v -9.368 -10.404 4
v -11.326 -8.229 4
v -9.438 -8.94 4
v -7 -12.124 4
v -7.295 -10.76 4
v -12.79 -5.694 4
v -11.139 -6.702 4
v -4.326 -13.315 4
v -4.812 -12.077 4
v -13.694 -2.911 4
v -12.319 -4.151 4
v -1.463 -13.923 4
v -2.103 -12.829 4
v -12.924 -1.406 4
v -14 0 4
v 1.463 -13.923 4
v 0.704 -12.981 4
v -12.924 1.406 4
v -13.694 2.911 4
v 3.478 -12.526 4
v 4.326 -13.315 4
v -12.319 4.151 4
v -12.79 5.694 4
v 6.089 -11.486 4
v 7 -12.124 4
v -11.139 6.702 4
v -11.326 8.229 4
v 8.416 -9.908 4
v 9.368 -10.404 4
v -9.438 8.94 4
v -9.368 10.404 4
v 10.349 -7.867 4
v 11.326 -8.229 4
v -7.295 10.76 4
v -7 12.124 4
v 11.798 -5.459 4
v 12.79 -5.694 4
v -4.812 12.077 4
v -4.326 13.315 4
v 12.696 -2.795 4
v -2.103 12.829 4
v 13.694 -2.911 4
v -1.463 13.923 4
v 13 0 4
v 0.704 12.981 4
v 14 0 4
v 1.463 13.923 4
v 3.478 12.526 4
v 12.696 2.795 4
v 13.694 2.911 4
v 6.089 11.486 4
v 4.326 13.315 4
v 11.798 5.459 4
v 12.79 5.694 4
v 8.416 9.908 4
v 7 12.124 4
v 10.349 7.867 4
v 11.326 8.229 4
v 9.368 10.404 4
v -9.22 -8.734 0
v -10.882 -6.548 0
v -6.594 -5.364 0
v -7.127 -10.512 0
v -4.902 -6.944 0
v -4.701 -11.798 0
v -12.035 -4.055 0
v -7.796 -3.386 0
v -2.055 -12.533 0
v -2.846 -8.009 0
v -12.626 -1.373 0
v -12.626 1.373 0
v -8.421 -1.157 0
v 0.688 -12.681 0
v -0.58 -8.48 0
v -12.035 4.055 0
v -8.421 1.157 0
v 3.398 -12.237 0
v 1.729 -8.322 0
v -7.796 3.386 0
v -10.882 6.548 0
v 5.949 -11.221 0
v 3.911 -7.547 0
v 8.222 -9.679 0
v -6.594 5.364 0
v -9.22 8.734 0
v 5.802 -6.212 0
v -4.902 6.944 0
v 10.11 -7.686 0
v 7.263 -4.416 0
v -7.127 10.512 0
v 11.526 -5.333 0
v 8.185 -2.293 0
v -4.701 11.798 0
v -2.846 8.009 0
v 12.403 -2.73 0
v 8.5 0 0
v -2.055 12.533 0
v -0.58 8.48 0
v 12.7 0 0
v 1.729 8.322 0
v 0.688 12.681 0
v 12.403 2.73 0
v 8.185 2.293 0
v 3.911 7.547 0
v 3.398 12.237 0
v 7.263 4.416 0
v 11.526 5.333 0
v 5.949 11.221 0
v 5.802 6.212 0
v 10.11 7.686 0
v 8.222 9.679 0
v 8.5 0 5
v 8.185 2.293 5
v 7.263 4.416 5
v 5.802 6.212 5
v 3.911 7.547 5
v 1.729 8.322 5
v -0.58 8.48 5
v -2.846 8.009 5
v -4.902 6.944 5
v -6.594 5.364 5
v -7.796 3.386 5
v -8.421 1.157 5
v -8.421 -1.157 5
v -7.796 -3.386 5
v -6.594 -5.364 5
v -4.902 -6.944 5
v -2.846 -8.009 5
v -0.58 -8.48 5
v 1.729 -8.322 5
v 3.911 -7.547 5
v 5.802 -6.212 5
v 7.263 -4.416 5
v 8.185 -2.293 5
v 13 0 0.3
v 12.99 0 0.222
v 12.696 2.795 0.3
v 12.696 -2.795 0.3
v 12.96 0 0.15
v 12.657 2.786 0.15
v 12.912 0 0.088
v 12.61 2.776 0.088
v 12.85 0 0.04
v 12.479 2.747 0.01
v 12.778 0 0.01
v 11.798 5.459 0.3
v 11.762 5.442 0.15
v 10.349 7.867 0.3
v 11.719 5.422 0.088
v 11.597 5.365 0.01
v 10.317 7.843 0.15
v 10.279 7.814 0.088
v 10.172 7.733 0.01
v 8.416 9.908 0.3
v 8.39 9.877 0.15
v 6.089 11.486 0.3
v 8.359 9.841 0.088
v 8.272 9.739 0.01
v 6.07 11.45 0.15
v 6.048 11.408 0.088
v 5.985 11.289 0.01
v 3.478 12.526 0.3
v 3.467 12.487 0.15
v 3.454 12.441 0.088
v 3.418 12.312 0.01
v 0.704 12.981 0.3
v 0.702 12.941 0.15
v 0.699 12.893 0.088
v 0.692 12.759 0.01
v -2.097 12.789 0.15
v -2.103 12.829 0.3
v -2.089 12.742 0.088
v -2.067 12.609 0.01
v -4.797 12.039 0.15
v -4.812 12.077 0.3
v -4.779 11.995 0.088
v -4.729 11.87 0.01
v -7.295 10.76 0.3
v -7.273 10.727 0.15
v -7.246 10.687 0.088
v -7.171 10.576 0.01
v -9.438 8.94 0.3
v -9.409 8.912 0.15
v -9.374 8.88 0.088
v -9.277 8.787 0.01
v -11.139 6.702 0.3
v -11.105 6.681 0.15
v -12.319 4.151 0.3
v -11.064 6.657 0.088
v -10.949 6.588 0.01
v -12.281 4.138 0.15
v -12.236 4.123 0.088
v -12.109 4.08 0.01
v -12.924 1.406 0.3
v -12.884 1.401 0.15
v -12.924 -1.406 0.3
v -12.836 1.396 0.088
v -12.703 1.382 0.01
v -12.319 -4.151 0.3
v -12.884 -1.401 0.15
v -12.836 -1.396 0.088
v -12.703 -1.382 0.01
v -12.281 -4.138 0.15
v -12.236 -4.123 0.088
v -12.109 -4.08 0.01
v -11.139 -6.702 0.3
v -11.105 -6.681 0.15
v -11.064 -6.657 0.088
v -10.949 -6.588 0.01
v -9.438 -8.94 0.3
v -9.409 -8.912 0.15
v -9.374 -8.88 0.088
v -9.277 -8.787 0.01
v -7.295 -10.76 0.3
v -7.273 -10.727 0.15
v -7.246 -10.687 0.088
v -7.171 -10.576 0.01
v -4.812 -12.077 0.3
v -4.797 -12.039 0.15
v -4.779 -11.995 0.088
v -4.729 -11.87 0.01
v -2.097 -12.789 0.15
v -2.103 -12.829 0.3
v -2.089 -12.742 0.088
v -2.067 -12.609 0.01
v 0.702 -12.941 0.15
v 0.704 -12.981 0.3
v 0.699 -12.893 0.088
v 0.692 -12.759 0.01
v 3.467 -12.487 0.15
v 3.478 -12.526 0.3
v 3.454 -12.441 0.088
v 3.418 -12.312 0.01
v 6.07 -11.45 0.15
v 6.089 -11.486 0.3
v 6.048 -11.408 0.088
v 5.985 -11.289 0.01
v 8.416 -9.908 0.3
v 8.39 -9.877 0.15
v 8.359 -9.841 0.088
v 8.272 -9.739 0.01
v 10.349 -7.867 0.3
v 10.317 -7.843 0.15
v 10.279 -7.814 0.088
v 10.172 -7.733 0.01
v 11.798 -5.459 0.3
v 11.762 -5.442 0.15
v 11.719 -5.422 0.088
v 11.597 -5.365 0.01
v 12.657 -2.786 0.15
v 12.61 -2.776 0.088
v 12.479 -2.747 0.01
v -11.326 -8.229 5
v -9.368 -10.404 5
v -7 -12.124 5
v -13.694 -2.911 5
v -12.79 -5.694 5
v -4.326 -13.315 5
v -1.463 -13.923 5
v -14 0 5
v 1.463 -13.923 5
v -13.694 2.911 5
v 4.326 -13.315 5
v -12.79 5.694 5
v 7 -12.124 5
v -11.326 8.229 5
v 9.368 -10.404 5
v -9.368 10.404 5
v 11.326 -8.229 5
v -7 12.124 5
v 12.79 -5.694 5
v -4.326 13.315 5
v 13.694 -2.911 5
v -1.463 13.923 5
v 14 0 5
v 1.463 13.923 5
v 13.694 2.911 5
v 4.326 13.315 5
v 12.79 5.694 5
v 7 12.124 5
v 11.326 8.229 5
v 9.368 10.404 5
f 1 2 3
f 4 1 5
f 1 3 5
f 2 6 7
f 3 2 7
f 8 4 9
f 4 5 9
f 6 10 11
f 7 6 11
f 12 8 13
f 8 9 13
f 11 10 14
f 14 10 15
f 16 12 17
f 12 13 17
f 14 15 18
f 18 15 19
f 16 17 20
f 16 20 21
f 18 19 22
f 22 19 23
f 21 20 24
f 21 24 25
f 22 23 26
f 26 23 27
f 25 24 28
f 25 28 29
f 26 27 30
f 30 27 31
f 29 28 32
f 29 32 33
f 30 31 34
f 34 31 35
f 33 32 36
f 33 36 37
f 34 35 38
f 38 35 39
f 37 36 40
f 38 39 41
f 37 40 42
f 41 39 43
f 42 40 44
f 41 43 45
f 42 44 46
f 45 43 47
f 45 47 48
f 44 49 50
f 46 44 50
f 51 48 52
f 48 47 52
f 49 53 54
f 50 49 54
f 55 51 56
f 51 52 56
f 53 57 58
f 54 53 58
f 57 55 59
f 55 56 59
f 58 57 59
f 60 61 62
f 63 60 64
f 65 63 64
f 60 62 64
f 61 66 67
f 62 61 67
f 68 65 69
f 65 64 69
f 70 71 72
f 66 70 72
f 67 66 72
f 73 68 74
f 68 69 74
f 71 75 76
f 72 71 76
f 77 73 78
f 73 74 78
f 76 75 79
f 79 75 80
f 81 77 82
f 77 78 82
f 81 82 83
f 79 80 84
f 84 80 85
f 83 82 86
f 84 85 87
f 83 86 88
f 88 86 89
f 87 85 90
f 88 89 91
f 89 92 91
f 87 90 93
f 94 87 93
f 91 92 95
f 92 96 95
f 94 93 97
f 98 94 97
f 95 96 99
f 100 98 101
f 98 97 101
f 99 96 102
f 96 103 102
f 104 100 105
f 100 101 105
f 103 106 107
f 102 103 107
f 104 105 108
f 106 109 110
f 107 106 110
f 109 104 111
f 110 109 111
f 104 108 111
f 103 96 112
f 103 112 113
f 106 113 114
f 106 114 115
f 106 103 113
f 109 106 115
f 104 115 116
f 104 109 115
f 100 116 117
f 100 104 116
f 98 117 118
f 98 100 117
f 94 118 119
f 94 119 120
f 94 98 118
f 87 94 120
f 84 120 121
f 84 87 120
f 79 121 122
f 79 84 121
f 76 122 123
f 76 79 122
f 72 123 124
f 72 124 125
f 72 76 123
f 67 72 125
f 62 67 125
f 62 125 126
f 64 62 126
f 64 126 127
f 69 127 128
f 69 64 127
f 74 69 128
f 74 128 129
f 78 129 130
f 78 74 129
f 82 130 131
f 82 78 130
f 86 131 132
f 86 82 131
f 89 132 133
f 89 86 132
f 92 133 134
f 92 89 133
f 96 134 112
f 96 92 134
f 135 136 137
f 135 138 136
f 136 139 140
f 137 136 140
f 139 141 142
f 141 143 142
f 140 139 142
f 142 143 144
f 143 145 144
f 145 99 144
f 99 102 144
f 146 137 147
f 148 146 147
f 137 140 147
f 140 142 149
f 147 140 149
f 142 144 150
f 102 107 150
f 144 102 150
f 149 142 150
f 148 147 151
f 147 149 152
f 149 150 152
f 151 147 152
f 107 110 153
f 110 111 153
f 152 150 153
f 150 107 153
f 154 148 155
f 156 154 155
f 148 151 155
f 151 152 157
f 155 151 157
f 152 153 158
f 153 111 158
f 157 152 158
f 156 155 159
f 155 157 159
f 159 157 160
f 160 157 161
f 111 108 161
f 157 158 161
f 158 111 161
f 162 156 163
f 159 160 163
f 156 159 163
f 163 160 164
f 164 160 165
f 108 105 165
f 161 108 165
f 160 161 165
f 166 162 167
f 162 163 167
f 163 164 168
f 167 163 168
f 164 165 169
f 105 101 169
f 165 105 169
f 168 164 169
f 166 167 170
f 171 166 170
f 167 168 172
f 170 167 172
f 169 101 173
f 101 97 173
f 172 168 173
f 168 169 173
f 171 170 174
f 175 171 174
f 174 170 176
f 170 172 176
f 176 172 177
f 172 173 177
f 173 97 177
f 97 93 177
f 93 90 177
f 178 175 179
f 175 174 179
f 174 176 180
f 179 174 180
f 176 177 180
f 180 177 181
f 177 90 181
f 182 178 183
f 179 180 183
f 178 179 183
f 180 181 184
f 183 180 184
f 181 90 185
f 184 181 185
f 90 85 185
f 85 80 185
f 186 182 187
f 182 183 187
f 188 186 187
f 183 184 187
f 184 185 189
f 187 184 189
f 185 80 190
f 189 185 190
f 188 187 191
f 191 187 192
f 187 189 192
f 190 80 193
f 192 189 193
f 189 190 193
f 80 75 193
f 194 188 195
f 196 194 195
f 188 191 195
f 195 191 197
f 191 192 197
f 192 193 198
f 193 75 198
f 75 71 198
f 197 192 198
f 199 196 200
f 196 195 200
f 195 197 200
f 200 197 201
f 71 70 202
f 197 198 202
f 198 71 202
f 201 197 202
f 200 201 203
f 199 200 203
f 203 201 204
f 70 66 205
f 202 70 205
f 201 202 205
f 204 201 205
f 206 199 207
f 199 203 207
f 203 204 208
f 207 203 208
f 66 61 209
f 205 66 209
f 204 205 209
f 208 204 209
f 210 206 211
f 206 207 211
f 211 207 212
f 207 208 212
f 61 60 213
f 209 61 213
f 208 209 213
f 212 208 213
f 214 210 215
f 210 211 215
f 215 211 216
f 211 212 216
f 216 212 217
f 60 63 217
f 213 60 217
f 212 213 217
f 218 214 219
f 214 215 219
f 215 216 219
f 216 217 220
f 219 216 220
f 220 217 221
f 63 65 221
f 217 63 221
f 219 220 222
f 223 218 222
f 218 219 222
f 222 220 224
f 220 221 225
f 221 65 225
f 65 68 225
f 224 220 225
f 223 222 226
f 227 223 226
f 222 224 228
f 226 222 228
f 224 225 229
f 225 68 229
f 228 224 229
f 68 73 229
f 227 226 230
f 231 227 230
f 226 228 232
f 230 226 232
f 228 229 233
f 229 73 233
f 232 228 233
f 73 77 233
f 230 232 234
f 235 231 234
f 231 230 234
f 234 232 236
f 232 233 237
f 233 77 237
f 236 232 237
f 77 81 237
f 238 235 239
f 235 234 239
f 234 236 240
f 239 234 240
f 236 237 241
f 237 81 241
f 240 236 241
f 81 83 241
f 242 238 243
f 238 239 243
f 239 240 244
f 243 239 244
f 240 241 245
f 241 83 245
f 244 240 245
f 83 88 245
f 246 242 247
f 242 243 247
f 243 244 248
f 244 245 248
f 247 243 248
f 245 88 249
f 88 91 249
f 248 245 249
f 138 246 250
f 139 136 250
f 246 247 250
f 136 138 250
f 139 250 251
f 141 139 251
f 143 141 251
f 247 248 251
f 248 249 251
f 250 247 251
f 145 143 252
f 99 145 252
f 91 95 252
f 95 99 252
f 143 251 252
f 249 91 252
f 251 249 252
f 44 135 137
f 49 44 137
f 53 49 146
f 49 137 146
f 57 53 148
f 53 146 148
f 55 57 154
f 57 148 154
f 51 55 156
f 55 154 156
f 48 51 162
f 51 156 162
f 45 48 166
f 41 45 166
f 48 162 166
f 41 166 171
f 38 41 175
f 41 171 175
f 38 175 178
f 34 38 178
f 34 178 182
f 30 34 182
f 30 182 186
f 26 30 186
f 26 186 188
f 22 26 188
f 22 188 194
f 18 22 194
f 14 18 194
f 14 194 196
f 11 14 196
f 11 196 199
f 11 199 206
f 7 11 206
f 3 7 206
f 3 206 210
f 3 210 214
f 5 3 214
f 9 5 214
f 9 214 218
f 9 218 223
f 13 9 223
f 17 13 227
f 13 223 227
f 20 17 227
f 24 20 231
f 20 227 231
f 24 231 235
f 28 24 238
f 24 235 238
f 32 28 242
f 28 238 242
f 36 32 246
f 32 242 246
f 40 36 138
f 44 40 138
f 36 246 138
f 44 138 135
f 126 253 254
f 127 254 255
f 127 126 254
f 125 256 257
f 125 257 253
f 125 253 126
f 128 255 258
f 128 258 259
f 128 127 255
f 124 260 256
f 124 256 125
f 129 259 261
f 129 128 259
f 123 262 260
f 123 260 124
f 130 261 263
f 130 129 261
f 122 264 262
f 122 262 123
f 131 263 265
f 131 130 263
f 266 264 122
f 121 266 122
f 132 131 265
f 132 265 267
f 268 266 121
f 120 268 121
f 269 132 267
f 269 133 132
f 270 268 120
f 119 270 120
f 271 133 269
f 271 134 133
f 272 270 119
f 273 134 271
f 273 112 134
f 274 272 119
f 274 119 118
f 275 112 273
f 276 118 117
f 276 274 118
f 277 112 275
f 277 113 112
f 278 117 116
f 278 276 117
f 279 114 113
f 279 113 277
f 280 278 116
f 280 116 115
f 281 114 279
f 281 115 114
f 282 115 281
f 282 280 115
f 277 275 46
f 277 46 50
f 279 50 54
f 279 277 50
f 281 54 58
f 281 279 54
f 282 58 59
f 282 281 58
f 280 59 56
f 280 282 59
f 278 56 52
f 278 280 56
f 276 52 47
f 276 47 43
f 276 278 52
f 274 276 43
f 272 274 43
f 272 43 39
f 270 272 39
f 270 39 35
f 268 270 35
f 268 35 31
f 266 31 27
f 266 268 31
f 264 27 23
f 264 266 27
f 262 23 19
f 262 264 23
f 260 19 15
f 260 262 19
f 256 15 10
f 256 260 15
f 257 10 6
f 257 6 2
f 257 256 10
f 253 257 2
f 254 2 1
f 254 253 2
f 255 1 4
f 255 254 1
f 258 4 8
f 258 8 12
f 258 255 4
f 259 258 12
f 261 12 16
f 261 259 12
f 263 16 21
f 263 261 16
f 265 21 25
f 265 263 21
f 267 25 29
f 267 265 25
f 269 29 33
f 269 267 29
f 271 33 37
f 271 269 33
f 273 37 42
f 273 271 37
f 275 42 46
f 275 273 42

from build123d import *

# Parameters (mm, degrees)
SKETCH_1_R      = 13
SKETCH_1_R_2    = 8.5
EXTRUDE_1_DEPTH = 5
SKETCH_2_R      = 14
SKETCH_2_R_2    = 13
EXTRUDE_2_DEPTH = 1
FILLET_1_R      = 0.3


with BuildPart() as part:
    # 草图1 → 凸台-拉伸1 (new body)
    with BuildSketch(Plane.XY):
        Circle(SKETCH_1_R)
        Circle(SKETCH_1_R_2, mode=Mode.SUBTRACT)
    extrude(amount=EXTRUDE_1_DEPTH)

    # 草图2 → 凸台-拉伸2 (add)
    with BuildSketch(Plane.XY.offset(5)):
        Circle(SKETCH_2_R)
        Circle(SKETCH_2_R_2, mode=Mode.SUBTRACT)
    extrude(amount=-EXTRUDE_2_DEPTH)

    # 圆角1
    fillet_1_edges = [part.edges().sort_by_distance(p)[0] for p in [
        (-13, 0, 0),
    ]]
    fillet(fillet_1_edges, radius=FILLET_1_R)


solid = part.part
